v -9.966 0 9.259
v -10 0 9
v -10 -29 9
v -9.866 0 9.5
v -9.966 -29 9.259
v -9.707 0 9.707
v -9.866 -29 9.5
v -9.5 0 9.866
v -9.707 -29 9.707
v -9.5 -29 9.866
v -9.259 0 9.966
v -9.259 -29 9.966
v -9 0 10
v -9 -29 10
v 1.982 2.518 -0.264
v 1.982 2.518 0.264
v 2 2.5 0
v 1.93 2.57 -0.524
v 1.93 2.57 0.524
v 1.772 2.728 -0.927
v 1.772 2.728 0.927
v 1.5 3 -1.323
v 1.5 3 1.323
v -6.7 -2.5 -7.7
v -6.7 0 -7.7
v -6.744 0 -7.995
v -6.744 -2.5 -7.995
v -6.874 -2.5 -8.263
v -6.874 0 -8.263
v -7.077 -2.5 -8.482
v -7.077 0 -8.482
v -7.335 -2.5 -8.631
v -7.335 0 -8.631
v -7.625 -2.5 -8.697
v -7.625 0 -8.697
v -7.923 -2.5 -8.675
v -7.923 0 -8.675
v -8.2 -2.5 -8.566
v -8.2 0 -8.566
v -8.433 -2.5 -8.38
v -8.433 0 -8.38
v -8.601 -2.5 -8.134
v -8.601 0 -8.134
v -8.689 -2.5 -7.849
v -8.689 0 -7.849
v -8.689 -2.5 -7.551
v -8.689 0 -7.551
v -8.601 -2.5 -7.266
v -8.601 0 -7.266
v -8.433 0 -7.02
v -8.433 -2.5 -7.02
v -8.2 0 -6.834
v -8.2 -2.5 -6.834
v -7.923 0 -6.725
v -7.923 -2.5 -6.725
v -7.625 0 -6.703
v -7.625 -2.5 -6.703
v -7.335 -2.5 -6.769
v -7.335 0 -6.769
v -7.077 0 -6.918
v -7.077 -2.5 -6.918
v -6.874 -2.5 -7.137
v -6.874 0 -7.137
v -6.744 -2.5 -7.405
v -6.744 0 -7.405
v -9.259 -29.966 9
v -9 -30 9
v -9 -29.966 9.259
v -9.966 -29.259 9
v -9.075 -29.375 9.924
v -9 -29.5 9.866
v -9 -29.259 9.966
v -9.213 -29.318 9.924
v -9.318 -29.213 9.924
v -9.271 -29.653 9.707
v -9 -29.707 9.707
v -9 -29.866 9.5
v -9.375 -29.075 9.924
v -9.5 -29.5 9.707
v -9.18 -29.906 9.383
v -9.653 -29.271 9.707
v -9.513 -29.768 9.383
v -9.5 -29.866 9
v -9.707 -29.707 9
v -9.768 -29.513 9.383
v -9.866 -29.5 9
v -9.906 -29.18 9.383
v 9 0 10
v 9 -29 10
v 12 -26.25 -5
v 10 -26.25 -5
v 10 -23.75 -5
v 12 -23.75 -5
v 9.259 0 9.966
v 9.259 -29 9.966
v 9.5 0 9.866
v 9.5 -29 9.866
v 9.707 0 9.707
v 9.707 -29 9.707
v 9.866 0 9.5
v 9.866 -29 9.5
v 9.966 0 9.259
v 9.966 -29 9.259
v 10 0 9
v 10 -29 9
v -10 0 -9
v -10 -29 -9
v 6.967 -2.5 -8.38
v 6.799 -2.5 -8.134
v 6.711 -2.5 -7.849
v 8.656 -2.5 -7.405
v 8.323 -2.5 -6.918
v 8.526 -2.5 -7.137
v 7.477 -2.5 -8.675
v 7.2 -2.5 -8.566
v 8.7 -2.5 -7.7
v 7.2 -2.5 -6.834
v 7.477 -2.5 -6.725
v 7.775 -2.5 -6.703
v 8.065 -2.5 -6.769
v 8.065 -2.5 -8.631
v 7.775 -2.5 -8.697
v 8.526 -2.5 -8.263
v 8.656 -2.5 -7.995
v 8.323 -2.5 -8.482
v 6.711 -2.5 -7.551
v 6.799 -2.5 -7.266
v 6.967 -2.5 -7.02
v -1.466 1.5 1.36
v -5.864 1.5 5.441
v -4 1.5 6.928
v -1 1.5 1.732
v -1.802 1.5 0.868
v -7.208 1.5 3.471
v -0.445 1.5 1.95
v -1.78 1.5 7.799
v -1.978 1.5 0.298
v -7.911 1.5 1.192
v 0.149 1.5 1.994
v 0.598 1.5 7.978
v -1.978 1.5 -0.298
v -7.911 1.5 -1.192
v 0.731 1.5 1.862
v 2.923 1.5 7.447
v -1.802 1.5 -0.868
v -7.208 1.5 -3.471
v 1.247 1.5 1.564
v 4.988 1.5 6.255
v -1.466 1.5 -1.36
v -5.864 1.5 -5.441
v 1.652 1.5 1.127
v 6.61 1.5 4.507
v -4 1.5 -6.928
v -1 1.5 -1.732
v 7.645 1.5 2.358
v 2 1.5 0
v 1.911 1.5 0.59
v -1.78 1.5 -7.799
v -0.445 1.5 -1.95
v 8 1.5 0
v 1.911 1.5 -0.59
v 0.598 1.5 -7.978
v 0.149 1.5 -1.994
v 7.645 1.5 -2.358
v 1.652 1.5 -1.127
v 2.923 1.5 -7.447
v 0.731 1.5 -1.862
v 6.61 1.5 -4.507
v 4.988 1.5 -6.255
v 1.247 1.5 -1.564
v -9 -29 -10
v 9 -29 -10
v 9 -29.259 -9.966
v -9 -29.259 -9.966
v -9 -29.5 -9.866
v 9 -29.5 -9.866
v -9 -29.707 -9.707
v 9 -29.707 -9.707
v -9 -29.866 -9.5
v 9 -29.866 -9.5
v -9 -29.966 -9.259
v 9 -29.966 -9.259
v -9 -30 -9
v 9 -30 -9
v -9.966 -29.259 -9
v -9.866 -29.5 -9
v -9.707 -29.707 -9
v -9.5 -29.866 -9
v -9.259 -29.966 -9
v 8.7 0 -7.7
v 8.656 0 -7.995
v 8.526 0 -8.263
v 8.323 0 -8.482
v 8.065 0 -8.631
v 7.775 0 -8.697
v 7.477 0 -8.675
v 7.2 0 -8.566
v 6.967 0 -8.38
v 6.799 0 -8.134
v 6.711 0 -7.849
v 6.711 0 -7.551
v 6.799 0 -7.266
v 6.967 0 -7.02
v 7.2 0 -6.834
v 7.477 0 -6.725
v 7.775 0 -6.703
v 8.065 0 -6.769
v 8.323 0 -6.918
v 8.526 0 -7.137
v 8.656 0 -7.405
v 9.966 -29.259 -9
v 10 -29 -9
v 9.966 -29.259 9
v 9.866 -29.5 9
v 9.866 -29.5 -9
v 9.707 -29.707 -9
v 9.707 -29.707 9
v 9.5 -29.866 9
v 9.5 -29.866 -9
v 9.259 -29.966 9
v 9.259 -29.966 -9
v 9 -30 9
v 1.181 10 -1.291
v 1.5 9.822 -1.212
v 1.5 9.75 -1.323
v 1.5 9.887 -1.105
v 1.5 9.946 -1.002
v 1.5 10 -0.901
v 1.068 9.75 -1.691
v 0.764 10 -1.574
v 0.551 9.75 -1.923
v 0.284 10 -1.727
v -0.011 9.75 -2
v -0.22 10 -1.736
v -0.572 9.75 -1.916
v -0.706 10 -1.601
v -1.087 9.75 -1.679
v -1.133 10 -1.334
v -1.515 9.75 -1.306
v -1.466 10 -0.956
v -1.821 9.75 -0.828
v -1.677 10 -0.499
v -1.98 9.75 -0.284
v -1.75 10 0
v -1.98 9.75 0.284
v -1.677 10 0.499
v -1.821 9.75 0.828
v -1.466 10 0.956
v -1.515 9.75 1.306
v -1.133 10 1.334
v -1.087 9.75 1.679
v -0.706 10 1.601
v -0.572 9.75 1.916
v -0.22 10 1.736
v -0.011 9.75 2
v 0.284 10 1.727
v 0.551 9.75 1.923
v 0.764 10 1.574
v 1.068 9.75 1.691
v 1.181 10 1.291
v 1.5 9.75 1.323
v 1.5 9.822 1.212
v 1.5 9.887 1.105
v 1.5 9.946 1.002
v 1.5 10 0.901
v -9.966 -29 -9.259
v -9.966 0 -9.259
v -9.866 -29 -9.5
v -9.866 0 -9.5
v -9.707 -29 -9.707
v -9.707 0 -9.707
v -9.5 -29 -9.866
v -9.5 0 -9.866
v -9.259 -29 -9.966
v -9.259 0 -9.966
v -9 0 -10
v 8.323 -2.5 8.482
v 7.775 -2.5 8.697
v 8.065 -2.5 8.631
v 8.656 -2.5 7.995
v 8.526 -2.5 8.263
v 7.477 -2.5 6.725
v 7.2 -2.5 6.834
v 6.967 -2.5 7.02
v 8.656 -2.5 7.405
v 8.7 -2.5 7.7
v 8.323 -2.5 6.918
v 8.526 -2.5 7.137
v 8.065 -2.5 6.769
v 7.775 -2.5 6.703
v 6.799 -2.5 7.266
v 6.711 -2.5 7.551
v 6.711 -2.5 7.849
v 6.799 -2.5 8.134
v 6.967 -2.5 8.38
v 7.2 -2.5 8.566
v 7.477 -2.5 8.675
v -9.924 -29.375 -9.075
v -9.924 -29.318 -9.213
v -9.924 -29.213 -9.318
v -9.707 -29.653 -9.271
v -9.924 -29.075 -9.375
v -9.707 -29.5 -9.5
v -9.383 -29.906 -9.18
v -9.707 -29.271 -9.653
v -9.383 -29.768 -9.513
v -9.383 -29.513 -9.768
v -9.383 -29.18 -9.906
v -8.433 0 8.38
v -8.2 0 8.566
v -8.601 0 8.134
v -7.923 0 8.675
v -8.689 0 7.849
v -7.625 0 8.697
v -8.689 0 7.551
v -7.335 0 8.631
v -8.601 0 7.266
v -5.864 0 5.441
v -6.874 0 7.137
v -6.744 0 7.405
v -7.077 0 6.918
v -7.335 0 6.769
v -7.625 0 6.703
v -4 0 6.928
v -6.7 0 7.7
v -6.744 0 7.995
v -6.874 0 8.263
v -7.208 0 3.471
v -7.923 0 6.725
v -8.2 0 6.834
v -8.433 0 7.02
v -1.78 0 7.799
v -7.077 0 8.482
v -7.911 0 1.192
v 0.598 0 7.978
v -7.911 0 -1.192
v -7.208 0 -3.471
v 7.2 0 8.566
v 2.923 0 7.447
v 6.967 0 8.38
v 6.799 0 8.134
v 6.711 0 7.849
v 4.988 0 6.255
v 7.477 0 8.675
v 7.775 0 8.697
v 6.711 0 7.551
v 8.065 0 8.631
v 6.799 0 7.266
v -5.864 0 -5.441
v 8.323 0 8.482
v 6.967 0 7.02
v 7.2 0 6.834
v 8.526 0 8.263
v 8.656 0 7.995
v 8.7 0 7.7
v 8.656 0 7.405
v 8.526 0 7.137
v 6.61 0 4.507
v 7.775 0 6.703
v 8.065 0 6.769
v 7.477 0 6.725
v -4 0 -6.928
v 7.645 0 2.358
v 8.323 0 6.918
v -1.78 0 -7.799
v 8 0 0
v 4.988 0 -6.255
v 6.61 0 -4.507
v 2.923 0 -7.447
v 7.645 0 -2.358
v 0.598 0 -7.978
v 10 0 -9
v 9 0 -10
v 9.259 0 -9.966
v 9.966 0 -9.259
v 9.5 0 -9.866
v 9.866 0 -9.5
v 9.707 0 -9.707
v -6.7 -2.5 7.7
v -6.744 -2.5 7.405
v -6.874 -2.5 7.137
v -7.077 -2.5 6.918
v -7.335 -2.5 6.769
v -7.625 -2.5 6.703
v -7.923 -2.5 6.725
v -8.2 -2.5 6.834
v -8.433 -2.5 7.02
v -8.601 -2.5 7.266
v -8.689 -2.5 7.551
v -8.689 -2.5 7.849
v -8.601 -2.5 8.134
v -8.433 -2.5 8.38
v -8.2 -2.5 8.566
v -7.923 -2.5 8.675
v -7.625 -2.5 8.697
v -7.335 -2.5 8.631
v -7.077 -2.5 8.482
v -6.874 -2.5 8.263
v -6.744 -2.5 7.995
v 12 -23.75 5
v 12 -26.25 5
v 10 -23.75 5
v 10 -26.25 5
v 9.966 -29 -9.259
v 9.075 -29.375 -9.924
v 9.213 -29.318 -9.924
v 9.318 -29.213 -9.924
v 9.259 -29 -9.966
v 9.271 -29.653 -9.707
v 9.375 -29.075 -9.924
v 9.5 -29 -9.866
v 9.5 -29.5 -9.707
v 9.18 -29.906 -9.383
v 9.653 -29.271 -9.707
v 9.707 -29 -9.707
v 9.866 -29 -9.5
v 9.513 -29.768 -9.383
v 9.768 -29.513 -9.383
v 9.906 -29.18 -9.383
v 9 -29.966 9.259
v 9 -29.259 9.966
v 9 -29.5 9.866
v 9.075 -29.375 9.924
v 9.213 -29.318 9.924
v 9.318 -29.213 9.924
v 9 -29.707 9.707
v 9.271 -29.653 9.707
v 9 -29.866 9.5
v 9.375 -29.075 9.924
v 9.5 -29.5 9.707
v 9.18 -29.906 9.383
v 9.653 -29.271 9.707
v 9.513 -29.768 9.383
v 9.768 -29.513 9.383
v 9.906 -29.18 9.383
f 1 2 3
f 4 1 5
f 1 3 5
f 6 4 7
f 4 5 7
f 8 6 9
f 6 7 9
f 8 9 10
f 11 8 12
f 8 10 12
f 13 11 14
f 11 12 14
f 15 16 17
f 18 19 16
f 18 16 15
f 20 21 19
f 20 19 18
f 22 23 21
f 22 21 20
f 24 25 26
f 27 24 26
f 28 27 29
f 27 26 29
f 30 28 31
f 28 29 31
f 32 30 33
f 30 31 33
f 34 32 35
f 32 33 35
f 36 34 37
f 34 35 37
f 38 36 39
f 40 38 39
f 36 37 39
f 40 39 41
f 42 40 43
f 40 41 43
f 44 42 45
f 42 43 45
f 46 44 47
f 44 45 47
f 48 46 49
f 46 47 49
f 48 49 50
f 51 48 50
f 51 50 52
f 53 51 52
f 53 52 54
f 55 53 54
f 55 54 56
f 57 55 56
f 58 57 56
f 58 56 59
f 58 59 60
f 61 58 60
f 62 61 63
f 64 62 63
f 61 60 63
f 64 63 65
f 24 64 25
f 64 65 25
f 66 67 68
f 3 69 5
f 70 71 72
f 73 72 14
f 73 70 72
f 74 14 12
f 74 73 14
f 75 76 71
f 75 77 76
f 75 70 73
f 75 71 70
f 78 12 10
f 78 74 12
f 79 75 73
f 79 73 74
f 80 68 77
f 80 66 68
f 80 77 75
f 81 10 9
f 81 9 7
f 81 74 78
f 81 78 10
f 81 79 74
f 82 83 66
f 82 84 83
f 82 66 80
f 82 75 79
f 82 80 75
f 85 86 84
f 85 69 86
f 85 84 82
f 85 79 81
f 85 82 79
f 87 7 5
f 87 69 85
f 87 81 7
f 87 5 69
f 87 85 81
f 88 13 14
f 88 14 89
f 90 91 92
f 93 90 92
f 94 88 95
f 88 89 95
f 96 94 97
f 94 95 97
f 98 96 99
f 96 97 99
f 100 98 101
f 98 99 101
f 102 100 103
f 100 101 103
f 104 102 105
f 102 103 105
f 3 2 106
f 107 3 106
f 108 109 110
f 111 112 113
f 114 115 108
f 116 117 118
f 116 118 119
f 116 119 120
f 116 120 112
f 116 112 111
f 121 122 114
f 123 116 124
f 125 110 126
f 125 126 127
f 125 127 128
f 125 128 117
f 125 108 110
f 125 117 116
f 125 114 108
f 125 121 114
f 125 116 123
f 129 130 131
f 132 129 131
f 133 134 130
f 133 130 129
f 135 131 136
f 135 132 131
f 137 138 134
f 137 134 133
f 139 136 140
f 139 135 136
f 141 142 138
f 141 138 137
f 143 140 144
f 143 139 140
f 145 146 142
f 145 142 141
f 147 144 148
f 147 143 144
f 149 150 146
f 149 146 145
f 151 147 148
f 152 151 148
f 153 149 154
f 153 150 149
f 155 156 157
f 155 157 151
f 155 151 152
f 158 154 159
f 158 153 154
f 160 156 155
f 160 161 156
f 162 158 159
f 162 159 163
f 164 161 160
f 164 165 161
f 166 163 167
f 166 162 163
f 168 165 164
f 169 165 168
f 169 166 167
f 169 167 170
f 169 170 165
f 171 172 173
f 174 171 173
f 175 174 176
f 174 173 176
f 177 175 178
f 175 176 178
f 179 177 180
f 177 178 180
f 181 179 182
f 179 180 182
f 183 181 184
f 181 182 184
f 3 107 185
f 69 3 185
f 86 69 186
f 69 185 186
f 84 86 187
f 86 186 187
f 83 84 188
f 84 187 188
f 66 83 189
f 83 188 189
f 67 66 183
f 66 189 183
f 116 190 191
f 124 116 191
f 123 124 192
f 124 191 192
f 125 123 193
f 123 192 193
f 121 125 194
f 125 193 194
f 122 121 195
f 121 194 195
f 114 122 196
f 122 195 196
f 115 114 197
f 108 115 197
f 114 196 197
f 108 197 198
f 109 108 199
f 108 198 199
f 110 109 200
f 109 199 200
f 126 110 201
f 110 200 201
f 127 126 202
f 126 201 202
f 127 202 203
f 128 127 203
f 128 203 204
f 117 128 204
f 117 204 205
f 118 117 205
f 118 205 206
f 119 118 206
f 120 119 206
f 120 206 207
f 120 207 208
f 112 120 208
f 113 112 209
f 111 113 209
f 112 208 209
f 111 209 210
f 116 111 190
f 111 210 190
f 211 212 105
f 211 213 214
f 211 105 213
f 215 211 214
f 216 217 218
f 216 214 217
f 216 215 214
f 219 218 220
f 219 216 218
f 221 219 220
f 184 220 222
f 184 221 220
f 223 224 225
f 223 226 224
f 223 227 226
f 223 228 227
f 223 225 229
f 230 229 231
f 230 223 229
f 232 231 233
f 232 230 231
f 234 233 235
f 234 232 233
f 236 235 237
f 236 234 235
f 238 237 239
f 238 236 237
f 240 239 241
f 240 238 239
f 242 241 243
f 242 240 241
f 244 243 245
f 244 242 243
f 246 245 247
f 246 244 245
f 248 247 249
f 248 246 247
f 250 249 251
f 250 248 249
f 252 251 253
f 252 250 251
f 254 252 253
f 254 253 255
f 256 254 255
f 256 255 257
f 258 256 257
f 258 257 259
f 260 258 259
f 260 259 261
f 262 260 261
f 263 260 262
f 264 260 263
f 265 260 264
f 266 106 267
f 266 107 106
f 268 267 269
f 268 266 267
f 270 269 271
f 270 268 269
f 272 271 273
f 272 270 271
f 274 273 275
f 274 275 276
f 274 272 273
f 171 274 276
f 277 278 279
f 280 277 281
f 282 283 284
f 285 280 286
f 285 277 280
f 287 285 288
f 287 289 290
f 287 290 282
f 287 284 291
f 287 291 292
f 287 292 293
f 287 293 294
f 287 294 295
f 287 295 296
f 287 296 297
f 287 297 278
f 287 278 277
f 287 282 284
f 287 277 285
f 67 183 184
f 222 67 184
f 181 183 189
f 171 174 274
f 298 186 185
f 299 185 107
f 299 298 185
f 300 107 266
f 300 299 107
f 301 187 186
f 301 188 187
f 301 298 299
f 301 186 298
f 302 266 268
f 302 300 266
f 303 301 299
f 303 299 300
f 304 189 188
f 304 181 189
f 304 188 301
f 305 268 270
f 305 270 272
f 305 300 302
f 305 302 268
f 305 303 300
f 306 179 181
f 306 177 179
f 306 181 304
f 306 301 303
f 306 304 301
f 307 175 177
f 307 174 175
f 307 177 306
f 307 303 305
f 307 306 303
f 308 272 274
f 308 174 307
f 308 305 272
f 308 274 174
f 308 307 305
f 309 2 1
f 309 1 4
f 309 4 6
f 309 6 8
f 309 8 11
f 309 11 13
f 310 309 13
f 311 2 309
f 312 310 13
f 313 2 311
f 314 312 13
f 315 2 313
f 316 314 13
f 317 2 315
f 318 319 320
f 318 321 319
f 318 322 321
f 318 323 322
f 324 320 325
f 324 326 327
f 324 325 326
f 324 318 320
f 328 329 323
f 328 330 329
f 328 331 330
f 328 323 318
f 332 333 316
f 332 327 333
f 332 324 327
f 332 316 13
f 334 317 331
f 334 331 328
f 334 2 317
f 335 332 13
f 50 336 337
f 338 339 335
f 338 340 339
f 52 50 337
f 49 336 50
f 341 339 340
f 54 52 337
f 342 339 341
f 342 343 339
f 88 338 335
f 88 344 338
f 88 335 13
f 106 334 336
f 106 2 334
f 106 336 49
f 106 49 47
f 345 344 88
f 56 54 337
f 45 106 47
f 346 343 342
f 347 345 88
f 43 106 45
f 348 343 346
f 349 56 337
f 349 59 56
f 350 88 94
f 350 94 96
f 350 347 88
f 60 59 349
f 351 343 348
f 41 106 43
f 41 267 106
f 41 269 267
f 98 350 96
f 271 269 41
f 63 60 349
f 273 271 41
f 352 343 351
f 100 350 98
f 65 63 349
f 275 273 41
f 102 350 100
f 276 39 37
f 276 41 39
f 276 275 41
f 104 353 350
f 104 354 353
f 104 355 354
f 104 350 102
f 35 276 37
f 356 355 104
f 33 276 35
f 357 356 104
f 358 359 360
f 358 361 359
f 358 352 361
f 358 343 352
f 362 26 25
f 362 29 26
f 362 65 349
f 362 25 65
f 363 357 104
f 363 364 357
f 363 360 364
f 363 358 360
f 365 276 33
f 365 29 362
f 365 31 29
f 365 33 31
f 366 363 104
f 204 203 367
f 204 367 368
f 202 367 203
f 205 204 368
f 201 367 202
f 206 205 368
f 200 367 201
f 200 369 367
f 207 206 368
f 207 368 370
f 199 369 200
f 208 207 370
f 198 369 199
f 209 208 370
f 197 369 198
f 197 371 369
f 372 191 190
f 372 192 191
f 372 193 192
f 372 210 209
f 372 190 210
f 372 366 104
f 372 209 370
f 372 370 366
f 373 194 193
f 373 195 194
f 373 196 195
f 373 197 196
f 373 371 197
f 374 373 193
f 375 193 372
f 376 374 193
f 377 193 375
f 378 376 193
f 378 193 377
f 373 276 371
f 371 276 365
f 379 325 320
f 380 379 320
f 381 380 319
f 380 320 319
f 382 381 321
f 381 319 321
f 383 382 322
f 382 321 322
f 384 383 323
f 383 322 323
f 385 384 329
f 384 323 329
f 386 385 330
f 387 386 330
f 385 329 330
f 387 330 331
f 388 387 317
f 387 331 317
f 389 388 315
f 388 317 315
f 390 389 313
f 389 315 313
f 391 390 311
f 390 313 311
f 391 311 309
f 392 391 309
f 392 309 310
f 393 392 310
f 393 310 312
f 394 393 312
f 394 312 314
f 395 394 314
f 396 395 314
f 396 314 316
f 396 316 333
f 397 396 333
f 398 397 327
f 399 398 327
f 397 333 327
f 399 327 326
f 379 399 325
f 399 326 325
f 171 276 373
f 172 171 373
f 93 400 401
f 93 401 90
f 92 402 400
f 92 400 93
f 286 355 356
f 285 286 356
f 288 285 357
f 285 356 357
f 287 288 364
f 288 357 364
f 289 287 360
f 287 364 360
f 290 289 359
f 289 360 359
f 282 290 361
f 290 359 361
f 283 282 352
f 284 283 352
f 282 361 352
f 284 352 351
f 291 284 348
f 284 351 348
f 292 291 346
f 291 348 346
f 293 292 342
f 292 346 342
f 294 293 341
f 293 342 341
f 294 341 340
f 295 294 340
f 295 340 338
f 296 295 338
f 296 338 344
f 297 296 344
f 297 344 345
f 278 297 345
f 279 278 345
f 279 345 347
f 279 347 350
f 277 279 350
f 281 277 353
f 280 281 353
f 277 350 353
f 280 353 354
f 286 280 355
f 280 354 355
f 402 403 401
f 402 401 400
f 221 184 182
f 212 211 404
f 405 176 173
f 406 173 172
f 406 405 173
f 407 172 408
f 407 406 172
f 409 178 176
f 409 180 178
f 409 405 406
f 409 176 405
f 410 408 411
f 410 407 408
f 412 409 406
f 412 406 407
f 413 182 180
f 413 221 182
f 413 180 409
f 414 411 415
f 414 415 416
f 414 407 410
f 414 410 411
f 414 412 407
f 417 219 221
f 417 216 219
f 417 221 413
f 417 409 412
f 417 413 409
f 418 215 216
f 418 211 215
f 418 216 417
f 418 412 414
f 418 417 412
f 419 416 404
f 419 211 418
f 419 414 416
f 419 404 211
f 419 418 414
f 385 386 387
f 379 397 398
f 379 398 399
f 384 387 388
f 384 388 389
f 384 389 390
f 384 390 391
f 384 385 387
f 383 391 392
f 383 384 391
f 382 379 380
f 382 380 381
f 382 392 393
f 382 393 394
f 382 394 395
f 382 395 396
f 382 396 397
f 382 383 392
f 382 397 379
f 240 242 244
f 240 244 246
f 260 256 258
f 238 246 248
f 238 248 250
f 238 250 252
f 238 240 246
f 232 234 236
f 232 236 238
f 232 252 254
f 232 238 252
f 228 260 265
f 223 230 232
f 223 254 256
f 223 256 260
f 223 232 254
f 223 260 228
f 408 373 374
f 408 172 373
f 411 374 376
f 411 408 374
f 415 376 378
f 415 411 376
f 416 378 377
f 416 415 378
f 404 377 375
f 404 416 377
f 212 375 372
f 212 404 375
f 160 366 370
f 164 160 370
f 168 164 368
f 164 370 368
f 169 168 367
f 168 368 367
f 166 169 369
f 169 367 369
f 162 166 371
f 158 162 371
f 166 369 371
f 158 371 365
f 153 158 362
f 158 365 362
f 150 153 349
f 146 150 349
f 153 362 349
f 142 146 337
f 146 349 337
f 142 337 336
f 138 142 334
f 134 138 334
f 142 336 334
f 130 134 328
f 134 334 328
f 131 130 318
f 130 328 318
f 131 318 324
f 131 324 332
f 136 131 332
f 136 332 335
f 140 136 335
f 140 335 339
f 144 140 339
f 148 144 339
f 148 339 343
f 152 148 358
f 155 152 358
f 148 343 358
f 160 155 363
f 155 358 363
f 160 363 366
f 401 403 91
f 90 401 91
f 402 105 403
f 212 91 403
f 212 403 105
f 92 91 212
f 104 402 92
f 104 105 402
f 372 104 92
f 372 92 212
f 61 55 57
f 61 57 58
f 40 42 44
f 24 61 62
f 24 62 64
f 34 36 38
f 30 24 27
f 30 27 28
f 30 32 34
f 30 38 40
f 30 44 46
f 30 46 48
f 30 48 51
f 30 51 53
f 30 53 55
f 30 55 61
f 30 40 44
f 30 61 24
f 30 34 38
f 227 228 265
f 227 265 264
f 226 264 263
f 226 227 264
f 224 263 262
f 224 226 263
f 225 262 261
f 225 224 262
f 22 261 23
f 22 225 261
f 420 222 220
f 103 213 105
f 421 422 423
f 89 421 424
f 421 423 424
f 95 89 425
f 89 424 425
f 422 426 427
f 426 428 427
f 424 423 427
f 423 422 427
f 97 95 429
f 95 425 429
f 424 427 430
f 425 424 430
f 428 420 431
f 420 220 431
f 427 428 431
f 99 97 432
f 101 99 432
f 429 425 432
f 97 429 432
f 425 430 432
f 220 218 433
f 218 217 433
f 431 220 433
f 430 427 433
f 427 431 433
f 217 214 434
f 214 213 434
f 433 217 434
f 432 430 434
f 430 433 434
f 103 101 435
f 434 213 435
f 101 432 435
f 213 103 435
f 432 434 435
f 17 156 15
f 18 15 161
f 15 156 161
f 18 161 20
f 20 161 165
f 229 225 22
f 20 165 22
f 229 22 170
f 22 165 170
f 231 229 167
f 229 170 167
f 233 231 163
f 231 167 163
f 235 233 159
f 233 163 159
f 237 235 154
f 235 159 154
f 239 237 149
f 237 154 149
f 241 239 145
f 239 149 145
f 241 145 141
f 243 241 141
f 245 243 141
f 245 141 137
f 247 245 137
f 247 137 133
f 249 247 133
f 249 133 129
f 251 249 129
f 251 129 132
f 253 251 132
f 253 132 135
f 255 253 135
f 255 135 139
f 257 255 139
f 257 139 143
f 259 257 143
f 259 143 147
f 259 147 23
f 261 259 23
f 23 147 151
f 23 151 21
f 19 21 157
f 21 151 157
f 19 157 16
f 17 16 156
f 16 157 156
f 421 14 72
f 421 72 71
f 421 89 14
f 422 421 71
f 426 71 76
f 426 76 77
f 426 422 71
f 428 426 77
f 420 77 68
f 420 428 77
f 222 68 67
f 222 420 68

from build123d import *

# Parameters (mm, degrees)
SKETCH1_W               = 20
SKETCH1_H               = 20
BOSS_EXTRUDE1_DEPTH     = 30
SKETCH2_R               = 1
CUT_EXTRUDE1_DEPTH      = 2.5
SKETCH3_R               = 8
BOSS_EXTRUDE2_DEPTH     = 1.5
SKETCH4_R               = 2
BOSS_EXTRUDE3_DEPTH     = 10
CUT_EXTRUDE2_DEPTH      = 11
CUT_EXTRUDE2_DEPTH_BACK = 11
CHAMFER1_SIZE           = 0.25
FILLET1_R               = 1
SKETCH6_W               = 10
SKETCH6_H               = 2.5
BOSS_EXTRUDE4_DEPTH     = 12


with BuildPart() as part:
    # Sketch1 → Boss-Extrude1 (new body)
    with BuildSketch(Plane(origin=(0, 0, 0), x_dir=(1, 0, 0), z_dir=(0, 1, 0))):
        Rectangle(SKETCH1_W, SKETCH1_H)
    extrude(amount=-BOSS_EXTRUDE1_DEPTH)

    # Sketch2 → Cut-Extrude1 (cut)
    with BuildSketch(Plane(origin=(0, 0, 0), x_dir=(1, 0, 0), z_dir=(0, 1, 0))):
        with Locations((-7.7, 7.7)):
            Circle(SKETCH2_R)
        with Locations((7.7, 7.7)):
            Circle(SKETCH2_R)
        with Locations((7.7, -7.7)):
            Circle(SKETCH2_R)
        with Locations((-7.7, -7.7)):
            Circle(SKETCH2_R)
    extrude(amount=-CUT_EXTRUDE1_DEPTH, mode=Mode.SUBTRACT)

    # Sketch3 → Boss-Extrude2 (add)
    with BuildSketch(Plane(origin=(0, 0, 0), x_dir=(1, 0, 0), z_dir=(0, 1, 0))):
        Circle(SKETCH3_R)
    extrude(amount=BOSS_EXTRUDE2_DEPTH)

    # Sketch4 → Boss-Extrude3 (add)
    with BuildSketch(Plane(origin=(0, 0, 0), x_dir=(1, 0, 0), z_dir=(0, 1, 0))):
        Circle(SKETCH4_R)
    extrude(amount=BOSS_EXTRUDE3_DEPTH)

    # Sketch5 → Cut-Extrude2 (cut, two sides)
    with BuildSketch(Plane.XY) as cut_extrude2_sk:
        Polygon((2, 10), (1.5, 10), (1.5, 3), (2, 2.5), align=None)
    extrude(amount=CUT_EXTRUDE2_DEPTH, mode=Mode.SUBTRACT)
    extrude(cut_extrude2_sk.sketch, amount=-CUT_EXTRUDE2_DEPTH_BACK, mode=Mode.SUBTRACT)

    # Chamfer1
    chamfer1_edges = [part.edges().sort_by_distance(p)[0] for p in [
        (-2, 10, 0),
    ]]
    chamfer(chamfer1_edges, length=CHAMFER1_SIZE)

    # Fillet1
    fillet1_edges = [part.edges().sort_by_distance(p)[0] for p in [
        (10, -30, 0),
        (0, -30, -10),
        (-10, -30, 0),
        (0, -30, 10),
        (-10, -15, -10),
        (10, -15, -10),
        (10, -15, 10),
        (-10, -15, 10),
    ]]
    fillet(fillet1_edges, radius=FILLET1_R)

    # Sketch6 → Boss-Extrude4 (add)
    with BuildSketch(Plane(origin=(0, 0, 0), x_dir=(0, 0, -1), z_dir=(1, 0, 0))):
        with Locations((0, -25)):
            Rectangle(SKETCH6_W, SKETCH6_H)
    extrude(amount=BOSS_EXTRUDE4_DEPTH)


solid = part.part
